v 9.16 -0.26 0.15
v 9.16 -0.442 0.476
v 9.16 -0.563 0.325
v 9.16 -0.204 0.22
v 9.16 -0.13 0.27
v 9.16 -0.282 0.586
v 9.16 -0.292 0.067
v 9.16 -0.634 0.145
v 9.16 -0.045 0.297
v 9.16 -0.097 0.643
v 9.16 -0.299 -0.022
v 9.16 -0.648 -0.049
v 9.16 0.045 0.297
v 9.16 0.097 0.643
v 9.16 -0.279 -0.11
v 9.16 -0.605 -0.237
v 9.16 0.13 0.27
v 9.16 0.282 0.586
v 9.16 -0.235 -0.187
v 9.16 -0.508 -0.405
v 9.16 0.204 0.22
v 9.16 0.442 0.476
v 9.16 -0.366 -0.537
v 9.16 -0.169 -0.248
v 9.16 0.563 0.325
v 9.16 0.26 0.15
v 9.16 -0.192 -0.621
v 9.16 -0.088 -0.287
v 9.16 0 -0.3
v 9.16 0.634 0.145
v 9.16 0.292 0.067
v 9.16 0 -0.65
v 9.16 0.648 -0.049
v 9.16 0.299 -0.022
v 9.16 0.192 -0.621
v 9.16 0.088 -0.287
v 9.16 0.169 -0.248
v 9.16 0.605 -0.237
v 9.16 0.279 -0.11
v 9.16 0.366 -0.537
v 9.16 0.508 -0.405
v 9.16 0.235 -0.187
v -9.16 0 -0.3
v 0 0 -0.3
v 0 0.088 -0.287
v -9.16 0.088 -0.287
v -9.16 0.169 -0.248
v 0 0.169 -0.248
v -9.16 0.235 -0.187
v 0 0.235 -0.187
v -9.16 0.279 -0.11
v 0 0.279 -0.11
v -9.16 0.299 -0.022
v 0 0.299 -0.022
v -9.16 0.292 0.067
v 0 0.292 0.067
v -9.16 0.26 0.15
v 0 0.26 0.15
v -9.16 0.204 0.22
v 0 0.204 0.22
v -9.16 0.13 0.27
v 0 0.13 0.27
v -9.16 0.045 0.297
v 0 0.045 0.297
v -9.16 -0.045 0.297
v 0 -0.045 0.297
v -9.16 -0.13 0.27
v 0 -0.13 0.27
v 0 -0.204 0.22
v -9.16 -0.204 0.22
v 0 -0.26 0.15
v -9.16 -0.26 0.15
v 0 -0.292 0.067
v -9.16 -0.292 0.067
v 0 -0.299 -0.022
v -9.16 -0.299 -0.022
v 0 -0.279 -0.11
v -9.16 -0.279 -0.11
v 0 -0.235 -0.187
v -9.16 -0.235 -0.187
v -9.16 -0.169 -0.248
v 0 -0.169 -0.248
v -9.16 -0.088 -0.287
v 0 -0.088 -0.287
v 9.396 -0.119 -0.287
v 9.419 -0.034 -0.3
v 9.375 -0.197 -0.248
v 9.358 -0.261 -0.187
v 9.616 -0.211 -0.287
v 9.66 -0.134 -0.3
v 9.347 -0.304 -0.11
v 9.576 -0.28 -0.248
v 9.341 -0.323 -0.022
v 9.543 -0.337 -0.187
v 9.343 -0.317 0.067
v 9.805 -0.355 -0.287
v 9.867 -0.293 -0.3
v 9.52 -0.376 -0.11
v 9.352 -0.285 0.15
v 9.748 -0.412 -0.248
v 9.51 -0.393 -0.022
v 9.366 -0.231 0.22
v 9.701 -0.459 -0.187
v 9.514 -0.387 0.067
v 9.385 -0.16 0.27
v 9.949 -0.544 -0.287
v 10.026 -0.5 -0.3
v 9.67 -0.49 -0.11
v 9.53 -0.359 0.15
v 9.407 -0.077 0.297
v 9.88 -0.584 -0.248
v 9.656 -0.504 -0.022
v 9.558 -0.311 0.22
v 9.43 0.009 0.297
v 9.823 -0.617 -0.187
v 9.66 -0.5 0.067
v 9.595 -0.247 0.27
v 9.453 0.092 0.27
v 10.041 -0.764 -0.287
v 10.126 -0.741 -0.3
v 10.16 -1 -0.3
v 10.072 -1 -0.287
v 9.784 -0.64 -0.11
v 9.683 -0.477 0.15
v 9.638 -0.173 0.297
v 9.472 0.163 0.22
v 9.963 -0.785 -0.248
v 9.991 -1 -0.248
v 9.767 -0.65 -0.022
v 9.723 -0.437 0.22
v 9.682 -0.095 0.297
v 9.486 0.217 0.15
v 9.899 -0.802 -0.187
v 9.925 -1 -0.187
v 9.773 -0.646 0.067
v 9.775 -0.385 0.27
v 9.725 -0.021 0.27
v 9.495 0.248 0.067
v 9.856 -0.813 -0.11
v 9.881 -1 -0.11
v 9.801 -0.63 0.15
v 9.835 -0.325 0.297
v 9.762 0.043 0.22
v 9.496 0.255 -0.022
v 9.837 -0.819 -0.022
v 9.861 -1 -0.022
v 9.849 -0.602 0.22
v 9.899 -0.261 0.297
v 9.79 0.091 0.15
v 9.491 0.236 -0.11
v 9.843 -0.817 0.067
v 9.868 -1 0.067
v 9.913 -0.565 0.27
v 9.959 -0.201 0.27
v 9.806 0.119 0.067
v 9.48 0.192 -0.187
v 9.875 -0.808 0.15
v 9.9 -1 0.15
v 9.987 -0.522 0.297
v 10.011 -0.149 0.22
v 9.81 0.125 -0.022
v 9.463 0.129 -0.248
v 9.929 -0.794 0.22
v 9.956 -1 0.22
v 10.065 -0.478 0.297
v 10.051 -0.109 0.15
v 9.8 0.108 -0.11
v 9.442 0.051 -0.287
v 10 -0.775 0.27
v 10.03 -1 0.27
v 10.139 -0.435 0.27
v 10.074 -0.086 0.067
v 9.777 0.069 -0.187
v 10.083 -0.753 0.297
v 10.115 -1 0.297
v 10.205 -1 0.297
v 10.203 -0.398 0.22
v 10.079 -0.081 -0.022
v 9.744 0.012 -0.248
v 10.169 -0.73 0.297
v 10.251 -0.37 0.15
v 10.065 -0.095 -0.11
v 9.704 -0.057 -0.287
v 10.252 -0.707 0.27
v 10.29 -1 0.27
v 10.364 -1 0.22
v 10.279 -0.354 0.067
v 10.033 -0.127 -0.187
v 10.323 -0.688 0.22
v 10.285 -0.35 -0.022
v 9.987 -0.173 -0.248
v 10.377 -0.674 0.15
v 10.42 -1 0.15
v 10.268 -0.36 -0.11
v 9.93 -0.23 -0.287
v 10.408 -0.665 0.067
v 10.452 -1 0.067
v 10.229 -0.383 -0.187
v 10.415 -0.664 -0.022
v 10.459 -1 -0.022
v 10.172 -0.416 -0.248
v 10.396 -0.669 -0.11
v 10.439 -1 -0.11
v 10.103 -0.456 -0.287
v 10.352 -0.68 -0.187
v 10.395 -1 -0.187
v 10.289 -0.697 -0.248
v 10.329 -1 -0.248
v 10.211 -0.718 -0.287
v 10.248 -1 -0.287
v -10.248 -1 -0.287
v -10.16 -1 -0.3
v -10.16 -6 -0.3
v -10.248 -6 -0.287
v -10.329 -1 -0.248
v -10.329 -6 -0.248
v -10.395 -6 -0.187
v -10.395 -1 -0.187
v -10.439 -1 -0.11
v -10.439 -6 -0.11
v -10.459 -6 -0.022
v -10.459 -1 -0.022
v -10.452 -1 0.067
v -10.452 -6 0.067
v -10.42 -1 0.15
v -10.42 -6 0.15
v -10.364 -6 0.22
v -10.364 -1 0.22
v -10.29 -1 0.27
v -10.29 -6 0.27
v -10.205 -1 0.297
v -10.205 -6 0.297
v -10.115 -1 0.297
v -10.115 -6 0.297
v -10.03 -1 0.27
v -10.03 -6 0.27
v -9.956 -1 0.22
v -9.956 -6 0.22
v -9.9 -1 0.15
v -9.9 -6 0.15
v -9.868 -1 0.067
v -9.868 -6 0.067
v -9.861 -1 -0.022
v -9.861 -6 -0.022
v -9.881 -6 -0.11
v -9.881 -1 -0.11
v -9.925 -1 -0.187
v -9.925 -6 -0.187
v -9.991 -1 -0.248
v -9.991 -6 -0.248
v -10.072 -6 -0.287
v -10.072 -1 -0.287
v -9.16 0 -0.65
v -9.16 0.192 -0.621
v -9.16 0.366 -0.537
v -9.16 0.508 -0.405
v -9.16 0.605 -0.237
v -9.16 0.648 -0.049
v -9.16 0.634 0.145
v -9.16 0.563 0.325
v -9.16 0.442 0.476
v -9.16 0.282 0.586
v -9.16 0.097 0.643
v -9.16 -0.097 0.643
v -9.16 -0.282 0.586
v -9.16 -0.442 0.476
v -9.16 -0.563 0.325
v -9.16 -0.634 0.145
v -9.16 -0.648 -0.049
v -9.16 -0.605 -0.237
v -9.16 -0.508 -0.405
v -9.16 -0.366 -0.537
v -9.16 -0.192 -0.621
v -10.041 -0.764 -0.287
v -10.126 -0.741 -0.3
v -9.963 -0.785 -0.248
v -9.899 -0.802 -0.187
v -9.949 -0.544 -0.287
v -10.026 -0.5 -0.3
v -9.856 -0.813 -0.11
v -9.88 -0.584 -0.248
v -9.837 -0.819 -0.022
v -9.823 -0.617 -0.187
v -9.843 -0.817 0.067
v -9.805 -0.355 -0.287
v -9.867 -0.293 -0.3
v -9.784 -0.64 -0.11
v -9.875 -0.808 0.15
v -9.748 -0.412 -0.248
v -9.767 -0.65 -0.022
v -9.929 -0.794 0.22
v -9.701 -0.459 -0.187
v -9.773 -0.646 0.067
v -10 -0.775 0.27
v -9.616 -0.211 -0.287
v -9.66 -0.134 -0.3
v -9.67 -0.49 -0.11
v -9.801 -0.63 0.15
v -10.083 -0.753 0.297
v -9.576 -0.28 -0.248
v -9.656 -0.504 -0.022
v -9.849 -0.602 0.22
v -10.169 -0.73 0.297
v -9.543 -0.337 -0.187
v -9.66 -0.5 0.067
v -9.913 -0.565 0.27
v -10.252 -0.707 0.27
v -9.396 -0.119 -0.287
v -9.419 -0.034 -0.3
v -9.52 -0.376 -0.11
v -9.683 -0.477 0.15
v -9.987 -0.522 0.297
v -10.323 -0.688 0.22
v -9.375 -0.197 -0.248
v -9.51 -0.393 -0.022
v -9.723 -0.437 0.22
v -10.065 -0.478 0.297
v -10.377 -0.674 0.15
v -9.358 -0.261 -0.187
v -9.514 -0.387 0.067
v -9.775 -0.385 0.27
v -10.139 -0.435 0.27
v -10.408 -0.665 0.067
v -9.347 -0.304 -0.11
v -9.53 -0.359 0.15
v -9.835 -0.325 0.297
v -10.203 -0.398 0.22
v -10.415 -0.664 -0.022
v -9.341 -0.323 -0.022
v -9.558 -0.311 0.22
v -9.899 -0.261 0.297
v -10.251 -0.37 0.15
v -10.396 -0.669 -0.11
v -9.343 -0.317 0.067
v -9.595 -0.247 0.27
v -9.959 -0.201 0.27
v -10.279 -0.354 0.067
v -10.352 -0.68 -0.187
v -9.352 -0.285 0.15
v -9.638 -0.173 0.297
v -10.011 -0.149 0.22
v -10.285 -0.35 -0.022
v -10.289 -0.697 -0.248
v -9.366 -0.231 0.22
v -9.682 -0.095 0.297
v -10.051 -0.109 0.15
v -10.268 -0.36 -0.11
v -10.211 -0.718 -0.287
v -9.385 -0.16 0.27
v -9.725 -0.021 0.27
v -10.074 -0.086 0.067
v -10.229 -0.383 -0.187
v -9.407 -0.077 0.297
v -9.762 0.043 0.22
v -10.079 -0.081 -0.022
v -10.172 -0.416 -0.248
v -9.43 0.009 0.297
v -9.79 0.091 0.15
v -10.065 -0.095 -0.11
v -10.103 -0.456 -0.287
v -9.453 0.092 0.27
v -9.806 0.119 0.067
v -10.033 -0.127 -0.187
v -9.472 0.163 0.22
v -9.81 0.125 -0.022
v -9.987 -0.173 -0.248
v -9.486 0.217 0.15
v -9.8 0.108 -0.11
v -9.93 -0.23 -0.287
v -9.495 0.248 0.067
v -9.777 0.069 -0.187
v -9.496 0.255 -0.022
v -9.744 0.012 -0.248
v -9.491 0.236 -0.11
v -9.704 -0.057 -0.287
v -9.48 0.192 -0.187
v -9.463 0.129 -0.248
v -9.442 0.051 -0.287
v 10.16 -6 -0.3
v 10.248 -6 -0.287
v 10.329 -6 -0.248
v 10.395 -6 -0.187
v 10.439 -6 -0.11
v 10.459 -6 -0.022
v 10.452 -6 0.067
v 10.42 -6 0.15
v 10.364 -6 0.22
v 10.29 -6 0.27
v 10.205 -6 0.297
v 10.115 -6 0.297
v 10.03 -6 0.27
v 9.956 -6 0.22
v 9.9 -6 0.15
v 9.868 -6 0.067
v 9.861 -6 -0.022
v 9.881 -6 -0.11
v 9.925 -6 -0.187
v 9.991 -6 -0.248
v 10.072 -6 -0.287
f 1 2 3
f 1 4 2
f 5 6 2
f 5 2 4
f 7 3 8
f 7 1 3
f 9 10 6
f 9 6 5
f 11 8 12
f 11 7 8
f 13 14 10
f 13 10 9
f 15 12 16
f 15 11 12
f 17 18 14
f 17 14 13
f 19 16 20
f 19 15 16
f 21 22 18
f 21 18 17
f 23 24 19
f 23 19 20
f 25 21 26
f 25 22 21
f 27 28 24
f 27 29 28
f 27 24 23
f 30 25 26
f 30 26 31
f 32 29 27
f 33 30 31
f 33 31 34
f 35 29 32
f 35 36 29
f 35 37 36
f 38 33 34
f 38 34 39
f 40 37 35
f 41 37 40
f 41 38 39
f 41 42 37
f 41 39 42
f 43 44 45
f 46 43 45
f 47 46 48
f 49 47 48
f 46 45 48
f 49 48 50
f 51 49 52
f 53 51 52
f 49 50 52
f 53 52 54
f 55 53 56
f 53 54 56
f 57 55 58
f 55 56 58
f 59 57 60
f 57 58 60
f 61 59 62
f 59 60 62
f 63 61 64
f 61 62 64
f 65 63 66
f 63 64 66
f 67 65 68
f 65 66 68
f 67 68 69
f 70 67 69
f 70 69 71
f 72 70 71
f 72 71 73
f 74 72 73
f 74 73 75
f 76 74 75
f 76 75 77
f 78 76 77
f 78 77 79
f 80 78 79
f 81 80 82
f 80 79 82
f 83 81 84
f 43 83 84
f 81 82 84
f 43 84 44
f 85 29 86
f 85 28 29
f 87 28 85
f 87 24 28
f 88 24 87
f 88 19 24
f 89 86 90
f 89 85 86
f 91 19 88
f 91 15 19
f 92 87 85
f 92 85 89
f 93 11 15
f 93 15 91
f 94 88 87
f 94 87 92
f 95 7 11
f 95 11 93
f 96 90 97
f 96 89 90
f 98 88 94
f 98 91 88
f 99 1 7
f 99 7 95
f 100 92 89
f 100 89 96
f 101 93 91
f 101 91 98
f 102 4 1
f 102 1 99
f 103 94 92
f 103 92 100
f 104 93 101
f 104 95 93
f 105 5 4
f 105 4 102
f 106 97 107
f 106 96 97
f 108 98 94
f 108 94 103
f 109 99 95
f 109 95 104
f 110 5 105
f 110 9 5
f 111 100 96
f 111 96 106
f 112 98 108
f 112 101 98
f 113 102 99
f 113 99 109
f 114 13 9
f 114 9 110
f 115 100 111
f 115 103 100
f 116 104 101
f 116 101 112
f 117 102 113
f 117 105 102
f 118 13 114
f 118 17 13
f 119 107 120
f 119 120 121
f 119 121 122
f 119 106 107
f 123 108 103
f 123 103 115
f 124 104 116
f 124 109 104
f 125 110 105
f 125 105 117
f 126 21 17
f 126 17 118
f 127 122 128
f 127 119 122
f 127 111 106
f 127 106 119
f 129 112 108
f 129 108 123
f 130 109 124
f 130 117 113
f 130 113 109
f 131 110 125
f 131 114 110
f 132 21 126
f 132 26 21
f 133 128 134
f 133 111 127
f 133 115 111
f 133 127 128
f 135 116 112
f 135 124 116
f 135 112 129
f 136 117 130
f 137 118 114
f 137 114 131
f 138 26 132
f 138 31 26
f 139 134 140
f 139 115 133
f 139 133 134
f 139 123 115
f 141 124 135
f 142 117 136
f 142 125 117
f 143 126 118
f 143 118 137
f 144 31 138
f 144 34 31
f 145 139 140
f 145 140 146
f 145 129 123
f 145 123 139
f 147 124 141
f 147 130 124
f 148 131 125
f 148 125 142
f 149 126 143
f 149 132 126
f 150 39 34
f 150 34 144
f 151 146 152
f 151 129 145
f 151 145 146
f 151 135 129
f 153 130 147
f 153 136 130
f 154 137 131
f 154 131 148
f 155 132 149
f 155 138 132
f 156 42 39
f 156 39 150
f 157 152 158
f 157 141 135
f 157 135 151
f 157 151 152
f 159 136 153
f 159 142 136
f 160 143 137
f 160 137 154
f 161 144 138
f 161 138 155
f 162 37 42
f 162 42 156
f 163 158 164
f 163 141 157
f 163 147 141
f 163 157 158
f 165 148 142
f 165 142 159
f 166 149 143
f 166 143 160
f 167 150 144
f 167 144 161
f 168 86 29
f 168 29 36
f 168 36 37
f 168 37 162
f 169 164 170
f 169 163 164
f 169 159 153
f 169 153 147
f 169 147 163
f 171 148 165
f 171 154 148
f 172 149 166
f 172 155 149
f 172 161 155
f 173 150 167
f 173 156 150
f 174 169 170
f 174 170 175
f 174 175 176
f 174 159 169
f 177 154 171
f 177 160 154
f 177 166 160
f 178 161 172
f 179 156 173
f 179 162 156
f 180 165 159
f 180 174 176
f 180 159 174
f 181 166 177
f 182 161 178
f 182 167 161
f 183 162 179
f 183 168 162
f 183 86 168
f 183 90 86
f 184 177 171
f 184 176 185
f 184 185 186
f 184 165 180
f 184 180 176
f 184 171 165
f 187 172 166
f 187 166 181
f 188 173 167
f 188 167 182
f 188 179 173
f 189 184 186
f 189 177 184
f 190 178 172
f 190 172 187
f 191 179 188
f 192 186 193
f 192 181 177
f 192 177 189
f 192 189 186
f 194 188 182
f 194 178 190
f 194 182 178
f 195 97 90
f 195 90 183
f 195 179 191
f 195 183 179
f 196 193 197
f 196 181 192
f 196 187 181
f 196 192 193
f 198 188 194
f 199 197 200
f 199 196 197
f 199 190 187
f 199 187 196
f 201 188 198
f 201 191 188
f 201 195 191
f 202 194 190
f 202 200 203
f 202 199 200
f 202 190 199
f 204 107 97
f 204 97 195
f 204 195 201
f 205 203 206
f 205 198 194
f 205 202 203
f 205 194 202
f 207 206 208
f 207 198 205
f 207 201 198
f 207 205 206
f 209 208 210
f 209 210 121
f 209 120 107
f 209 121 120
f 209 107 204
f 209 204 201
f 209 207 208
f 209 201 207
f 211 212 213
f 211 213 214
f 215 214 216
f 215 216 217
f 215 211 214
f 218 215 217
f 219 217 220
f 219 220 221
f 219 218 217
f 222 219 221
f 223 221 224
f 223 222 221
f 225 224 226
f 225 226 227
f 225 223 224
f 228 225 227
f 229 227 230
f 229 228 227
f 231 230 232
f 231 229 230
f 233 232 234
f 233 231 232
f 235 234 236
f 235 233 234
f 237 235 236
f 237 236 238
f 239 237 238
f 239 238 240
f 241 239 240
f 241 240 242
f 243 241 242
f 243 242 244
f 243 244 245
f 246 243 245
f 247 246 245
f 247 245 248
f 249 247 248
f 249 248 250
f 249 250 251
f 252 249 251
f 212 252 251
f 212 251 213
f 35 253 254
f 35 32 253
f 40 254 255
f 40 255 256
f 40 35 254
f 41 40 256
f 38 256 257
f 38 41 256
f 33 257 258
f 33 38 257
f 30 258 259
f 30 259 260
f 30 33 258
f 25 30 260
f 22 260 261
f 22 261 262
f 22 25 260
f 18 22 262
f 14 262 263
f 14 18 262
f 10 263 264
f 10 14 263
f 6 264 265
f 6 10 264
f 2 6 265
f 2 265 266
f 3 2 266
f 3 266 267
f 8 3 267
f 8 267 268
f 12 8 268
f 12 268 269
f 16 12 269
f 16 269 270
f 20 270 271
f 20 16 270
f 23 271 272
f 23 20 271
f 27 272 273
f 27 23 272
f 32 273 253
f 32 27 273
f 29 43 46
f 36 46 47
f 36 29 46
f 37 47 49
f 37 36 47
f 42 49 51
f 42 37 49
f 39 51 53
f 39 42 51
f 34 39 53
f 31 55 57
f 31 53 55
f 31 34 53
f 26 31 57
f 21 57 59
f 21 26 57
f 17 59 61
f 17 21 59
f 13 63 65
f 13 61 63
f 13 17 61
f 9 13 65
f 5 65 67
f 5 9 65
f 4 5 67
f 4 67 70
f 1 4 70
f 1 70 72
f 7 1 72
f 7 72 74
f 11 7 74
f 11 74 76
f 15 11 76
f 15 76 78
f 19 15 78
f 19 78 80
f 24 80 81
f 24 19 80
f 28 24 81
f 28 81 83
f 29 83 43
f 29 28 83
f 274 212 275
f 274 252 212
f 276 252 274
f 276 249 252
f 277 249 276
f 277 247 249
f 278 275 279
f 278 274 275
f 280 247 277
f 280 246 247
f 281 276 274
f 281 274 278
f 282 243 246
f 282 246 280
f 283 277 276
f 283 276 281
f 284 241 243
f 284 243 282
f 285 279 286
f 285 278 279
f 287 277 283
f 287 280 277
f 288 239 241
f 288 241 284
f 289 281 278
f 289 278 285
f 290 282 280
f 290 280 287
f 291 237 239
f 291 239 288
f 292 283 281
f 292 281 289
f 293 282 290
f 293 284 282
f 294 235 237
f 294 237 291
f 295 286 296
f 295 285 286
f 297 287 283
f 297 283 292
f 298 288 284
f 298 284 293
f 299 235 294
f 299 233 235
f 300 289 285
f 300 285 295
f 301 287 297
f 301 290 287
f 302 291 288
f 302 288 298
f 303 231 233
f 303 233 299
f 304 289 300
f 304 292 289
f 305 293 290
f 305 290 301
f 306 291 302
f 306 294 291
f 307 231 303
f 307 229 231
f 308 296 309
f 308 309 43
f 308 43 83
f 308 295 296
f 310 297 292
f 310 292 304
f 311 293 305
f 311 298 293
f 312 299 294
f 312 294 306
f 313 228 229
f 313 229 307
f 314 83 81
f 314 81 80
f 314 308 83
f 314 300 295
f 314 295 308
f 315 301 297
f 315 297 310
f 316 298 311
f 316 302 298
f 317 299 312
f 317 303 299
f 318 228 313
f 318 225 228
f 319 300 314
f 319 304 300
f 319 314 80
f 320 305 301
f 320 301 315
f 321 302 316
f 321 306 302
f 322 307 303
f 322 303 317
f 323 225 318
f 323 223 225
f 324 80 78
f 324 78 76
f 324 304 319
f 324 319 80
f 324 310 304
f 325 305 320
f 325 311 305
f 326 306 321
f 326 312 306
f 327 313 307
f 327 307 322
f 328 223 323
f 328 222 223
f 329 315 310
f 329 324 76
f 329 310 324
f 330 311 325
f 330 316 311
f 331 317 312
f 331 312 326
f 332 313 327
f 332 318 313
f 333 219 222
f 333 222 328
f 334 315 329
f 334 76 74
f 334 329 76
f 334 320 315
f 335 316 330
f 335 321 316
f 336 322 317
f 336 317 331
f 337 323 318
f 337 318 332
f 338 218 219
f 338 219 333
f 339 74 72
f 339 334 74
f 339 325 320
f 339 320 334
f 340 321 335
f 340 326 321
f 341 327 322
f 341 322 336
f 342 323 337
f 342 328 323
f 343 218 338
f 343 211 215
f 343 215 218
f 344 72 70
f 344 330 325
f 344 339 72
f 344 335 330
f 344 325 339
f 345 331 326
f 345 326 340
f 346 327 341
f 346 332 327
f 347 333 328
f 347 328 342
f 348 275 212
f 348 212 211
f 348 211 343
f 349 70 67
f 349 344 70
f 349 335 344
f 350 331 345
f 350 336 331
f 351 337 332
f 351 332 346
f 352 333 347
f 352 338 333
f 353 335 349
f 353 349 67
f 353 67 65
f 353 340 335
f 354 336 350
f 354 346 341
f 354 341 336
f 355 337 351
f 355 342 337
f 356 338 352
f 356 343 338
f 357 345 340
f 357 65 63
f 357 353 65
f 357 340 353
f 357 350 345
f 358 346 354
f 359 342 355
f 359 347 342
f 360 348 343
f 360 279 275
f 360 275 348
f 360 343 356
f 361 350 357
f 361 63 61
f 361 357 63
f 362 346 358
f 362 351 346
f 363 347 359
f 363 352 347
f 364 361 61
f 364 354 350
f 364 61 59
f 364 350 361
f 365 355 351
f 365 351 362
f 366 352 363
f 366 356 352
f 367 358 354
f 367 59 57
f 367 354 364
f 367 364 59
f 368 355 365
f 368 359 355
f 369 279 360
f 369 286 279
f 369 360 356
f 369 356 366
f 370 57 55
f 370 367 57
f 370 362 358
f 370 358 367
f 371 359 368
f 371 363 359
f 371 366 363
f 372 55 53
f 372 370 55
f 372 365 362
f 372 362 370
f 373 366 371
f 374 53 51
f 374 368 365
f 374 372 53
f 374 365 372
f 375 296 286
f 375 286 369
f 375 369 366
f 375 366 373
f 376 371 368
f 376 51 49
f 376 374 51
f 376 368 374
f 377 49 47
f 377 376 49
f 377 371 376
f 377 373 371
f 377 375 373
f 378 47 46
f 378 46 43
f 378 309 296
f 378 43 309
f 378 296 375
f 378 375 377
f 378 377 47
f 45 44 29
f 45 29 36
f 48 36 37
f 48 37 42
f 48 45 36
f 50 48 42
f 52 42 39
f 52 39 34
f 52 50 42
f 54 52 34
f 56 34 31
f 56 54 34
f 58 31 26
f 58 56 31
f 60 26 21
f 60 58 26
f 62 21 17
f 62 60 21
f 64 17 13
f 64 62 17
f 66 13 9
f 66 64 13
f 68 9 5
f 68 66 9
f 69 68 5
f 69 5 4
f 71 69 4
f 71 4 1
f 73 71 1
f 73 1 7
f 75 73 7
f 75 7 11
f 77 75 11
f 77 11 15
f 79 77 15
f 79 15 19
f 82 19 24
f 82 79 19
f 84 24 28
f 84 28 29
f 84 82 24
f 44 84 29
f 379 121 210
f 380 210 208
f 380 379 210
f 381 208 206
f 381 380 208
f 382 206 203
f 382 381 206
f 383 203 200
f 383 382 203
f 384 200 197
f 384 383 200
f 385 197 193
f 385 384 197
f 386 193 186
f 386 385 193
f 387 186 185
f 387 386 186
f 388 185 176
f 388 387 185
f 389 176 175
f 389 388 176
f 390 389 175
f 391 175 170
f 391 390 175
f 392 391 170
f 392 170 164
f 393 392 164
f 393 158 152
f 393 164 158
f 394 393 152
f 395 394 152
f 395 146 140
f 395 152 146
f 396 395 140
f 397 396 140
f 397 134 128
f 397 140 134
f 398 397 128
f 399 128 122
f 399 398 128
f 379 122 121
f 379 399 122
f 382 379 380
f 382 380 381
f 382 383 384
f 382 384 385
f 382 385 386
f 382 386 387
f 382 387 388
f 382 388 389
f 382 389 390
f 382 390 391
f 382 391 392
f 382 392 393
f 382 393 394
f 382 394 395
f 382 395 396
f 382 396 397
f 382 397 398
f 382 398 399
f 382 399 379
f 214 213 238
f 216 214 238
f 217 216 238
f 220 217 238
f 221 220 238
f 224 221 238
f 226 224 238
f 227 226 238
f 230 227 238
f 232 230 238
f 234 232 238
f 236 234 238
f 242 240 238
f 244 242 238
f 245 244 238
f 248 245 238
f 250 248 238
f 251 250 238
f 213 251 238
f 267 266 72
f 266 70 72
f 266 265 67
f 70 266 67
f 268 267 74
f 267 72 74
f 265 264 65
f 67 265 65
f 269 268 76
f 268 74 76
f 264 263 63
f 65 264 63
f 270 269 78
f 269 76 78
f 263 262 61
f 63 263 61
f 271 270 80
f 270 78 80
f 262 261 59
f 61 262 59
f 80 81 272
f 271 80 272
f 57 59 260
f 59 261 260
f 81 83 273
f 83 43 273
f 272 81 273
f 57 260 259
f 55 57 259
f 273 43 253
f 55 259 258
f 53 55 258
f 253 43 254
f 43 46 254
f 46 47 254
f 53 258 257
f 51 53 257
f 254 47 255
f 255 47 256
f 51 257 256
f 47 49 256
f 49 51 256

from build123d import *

# Parameters (mm, degrees)
SKETCH2_R                = 0.3
SKETCH3_R                = 0.65
SKETCH3_R_2              = 0.3
BOSS_EXTRUDE1_DEPTH      = 9.16
BOSS_EXTRUDE1_DEPTH_BACK = 9.16


with BuildPart() as part:
    # Sweep1: sweep along a path in Sketch1
    with BuildLine(Plane.XY) as sweep1_path:
        Line((-10.16, -6), (-10.16, -1))
        ThreePointArc((-10.16, -1), (-9.867106781, -0.292893219), (-9.16, 0))
        Line((-9.16, 0), (9.16, 0))
        ThreePointArc((9.16, 0), (9.867106781, -0.292893219), (10.16, -1))
        Line((10.16, -1), (10.16, -6))
    # Sketch2 → Sweep1 (sweep)
    with BuildSketch(Plane(origin=(0, 0, 0), x_dir=(0, 0, -1), z_dir=(1, 0, 0))):
        Circle(SKETCH2_R)
    sweep(path=sweep1_path.line)


with BuildPart() as body_2:
    # Sketch3 → Boss-Extrude1 (new body, two sides)
    with BuildSketch(Plane(origin=(0, 0, 0), x_dir=(0, 0, -1), z_dir=(1, 0, 0))) as boss_extrude1_sk:
        Circle(SKETCH3_R)
        Circle(SKETCH3_R_2, mode=Mode.SUBTRACT)
    extrude(amount=BOSS_EXTRUDE1_DEPTH)
    extrude(boss_extrude1_sk.sketch, amount=-BOSS_EXTRUDE1_DEPTH_BACK)


solid = Compound([part.part, body_2.part])
